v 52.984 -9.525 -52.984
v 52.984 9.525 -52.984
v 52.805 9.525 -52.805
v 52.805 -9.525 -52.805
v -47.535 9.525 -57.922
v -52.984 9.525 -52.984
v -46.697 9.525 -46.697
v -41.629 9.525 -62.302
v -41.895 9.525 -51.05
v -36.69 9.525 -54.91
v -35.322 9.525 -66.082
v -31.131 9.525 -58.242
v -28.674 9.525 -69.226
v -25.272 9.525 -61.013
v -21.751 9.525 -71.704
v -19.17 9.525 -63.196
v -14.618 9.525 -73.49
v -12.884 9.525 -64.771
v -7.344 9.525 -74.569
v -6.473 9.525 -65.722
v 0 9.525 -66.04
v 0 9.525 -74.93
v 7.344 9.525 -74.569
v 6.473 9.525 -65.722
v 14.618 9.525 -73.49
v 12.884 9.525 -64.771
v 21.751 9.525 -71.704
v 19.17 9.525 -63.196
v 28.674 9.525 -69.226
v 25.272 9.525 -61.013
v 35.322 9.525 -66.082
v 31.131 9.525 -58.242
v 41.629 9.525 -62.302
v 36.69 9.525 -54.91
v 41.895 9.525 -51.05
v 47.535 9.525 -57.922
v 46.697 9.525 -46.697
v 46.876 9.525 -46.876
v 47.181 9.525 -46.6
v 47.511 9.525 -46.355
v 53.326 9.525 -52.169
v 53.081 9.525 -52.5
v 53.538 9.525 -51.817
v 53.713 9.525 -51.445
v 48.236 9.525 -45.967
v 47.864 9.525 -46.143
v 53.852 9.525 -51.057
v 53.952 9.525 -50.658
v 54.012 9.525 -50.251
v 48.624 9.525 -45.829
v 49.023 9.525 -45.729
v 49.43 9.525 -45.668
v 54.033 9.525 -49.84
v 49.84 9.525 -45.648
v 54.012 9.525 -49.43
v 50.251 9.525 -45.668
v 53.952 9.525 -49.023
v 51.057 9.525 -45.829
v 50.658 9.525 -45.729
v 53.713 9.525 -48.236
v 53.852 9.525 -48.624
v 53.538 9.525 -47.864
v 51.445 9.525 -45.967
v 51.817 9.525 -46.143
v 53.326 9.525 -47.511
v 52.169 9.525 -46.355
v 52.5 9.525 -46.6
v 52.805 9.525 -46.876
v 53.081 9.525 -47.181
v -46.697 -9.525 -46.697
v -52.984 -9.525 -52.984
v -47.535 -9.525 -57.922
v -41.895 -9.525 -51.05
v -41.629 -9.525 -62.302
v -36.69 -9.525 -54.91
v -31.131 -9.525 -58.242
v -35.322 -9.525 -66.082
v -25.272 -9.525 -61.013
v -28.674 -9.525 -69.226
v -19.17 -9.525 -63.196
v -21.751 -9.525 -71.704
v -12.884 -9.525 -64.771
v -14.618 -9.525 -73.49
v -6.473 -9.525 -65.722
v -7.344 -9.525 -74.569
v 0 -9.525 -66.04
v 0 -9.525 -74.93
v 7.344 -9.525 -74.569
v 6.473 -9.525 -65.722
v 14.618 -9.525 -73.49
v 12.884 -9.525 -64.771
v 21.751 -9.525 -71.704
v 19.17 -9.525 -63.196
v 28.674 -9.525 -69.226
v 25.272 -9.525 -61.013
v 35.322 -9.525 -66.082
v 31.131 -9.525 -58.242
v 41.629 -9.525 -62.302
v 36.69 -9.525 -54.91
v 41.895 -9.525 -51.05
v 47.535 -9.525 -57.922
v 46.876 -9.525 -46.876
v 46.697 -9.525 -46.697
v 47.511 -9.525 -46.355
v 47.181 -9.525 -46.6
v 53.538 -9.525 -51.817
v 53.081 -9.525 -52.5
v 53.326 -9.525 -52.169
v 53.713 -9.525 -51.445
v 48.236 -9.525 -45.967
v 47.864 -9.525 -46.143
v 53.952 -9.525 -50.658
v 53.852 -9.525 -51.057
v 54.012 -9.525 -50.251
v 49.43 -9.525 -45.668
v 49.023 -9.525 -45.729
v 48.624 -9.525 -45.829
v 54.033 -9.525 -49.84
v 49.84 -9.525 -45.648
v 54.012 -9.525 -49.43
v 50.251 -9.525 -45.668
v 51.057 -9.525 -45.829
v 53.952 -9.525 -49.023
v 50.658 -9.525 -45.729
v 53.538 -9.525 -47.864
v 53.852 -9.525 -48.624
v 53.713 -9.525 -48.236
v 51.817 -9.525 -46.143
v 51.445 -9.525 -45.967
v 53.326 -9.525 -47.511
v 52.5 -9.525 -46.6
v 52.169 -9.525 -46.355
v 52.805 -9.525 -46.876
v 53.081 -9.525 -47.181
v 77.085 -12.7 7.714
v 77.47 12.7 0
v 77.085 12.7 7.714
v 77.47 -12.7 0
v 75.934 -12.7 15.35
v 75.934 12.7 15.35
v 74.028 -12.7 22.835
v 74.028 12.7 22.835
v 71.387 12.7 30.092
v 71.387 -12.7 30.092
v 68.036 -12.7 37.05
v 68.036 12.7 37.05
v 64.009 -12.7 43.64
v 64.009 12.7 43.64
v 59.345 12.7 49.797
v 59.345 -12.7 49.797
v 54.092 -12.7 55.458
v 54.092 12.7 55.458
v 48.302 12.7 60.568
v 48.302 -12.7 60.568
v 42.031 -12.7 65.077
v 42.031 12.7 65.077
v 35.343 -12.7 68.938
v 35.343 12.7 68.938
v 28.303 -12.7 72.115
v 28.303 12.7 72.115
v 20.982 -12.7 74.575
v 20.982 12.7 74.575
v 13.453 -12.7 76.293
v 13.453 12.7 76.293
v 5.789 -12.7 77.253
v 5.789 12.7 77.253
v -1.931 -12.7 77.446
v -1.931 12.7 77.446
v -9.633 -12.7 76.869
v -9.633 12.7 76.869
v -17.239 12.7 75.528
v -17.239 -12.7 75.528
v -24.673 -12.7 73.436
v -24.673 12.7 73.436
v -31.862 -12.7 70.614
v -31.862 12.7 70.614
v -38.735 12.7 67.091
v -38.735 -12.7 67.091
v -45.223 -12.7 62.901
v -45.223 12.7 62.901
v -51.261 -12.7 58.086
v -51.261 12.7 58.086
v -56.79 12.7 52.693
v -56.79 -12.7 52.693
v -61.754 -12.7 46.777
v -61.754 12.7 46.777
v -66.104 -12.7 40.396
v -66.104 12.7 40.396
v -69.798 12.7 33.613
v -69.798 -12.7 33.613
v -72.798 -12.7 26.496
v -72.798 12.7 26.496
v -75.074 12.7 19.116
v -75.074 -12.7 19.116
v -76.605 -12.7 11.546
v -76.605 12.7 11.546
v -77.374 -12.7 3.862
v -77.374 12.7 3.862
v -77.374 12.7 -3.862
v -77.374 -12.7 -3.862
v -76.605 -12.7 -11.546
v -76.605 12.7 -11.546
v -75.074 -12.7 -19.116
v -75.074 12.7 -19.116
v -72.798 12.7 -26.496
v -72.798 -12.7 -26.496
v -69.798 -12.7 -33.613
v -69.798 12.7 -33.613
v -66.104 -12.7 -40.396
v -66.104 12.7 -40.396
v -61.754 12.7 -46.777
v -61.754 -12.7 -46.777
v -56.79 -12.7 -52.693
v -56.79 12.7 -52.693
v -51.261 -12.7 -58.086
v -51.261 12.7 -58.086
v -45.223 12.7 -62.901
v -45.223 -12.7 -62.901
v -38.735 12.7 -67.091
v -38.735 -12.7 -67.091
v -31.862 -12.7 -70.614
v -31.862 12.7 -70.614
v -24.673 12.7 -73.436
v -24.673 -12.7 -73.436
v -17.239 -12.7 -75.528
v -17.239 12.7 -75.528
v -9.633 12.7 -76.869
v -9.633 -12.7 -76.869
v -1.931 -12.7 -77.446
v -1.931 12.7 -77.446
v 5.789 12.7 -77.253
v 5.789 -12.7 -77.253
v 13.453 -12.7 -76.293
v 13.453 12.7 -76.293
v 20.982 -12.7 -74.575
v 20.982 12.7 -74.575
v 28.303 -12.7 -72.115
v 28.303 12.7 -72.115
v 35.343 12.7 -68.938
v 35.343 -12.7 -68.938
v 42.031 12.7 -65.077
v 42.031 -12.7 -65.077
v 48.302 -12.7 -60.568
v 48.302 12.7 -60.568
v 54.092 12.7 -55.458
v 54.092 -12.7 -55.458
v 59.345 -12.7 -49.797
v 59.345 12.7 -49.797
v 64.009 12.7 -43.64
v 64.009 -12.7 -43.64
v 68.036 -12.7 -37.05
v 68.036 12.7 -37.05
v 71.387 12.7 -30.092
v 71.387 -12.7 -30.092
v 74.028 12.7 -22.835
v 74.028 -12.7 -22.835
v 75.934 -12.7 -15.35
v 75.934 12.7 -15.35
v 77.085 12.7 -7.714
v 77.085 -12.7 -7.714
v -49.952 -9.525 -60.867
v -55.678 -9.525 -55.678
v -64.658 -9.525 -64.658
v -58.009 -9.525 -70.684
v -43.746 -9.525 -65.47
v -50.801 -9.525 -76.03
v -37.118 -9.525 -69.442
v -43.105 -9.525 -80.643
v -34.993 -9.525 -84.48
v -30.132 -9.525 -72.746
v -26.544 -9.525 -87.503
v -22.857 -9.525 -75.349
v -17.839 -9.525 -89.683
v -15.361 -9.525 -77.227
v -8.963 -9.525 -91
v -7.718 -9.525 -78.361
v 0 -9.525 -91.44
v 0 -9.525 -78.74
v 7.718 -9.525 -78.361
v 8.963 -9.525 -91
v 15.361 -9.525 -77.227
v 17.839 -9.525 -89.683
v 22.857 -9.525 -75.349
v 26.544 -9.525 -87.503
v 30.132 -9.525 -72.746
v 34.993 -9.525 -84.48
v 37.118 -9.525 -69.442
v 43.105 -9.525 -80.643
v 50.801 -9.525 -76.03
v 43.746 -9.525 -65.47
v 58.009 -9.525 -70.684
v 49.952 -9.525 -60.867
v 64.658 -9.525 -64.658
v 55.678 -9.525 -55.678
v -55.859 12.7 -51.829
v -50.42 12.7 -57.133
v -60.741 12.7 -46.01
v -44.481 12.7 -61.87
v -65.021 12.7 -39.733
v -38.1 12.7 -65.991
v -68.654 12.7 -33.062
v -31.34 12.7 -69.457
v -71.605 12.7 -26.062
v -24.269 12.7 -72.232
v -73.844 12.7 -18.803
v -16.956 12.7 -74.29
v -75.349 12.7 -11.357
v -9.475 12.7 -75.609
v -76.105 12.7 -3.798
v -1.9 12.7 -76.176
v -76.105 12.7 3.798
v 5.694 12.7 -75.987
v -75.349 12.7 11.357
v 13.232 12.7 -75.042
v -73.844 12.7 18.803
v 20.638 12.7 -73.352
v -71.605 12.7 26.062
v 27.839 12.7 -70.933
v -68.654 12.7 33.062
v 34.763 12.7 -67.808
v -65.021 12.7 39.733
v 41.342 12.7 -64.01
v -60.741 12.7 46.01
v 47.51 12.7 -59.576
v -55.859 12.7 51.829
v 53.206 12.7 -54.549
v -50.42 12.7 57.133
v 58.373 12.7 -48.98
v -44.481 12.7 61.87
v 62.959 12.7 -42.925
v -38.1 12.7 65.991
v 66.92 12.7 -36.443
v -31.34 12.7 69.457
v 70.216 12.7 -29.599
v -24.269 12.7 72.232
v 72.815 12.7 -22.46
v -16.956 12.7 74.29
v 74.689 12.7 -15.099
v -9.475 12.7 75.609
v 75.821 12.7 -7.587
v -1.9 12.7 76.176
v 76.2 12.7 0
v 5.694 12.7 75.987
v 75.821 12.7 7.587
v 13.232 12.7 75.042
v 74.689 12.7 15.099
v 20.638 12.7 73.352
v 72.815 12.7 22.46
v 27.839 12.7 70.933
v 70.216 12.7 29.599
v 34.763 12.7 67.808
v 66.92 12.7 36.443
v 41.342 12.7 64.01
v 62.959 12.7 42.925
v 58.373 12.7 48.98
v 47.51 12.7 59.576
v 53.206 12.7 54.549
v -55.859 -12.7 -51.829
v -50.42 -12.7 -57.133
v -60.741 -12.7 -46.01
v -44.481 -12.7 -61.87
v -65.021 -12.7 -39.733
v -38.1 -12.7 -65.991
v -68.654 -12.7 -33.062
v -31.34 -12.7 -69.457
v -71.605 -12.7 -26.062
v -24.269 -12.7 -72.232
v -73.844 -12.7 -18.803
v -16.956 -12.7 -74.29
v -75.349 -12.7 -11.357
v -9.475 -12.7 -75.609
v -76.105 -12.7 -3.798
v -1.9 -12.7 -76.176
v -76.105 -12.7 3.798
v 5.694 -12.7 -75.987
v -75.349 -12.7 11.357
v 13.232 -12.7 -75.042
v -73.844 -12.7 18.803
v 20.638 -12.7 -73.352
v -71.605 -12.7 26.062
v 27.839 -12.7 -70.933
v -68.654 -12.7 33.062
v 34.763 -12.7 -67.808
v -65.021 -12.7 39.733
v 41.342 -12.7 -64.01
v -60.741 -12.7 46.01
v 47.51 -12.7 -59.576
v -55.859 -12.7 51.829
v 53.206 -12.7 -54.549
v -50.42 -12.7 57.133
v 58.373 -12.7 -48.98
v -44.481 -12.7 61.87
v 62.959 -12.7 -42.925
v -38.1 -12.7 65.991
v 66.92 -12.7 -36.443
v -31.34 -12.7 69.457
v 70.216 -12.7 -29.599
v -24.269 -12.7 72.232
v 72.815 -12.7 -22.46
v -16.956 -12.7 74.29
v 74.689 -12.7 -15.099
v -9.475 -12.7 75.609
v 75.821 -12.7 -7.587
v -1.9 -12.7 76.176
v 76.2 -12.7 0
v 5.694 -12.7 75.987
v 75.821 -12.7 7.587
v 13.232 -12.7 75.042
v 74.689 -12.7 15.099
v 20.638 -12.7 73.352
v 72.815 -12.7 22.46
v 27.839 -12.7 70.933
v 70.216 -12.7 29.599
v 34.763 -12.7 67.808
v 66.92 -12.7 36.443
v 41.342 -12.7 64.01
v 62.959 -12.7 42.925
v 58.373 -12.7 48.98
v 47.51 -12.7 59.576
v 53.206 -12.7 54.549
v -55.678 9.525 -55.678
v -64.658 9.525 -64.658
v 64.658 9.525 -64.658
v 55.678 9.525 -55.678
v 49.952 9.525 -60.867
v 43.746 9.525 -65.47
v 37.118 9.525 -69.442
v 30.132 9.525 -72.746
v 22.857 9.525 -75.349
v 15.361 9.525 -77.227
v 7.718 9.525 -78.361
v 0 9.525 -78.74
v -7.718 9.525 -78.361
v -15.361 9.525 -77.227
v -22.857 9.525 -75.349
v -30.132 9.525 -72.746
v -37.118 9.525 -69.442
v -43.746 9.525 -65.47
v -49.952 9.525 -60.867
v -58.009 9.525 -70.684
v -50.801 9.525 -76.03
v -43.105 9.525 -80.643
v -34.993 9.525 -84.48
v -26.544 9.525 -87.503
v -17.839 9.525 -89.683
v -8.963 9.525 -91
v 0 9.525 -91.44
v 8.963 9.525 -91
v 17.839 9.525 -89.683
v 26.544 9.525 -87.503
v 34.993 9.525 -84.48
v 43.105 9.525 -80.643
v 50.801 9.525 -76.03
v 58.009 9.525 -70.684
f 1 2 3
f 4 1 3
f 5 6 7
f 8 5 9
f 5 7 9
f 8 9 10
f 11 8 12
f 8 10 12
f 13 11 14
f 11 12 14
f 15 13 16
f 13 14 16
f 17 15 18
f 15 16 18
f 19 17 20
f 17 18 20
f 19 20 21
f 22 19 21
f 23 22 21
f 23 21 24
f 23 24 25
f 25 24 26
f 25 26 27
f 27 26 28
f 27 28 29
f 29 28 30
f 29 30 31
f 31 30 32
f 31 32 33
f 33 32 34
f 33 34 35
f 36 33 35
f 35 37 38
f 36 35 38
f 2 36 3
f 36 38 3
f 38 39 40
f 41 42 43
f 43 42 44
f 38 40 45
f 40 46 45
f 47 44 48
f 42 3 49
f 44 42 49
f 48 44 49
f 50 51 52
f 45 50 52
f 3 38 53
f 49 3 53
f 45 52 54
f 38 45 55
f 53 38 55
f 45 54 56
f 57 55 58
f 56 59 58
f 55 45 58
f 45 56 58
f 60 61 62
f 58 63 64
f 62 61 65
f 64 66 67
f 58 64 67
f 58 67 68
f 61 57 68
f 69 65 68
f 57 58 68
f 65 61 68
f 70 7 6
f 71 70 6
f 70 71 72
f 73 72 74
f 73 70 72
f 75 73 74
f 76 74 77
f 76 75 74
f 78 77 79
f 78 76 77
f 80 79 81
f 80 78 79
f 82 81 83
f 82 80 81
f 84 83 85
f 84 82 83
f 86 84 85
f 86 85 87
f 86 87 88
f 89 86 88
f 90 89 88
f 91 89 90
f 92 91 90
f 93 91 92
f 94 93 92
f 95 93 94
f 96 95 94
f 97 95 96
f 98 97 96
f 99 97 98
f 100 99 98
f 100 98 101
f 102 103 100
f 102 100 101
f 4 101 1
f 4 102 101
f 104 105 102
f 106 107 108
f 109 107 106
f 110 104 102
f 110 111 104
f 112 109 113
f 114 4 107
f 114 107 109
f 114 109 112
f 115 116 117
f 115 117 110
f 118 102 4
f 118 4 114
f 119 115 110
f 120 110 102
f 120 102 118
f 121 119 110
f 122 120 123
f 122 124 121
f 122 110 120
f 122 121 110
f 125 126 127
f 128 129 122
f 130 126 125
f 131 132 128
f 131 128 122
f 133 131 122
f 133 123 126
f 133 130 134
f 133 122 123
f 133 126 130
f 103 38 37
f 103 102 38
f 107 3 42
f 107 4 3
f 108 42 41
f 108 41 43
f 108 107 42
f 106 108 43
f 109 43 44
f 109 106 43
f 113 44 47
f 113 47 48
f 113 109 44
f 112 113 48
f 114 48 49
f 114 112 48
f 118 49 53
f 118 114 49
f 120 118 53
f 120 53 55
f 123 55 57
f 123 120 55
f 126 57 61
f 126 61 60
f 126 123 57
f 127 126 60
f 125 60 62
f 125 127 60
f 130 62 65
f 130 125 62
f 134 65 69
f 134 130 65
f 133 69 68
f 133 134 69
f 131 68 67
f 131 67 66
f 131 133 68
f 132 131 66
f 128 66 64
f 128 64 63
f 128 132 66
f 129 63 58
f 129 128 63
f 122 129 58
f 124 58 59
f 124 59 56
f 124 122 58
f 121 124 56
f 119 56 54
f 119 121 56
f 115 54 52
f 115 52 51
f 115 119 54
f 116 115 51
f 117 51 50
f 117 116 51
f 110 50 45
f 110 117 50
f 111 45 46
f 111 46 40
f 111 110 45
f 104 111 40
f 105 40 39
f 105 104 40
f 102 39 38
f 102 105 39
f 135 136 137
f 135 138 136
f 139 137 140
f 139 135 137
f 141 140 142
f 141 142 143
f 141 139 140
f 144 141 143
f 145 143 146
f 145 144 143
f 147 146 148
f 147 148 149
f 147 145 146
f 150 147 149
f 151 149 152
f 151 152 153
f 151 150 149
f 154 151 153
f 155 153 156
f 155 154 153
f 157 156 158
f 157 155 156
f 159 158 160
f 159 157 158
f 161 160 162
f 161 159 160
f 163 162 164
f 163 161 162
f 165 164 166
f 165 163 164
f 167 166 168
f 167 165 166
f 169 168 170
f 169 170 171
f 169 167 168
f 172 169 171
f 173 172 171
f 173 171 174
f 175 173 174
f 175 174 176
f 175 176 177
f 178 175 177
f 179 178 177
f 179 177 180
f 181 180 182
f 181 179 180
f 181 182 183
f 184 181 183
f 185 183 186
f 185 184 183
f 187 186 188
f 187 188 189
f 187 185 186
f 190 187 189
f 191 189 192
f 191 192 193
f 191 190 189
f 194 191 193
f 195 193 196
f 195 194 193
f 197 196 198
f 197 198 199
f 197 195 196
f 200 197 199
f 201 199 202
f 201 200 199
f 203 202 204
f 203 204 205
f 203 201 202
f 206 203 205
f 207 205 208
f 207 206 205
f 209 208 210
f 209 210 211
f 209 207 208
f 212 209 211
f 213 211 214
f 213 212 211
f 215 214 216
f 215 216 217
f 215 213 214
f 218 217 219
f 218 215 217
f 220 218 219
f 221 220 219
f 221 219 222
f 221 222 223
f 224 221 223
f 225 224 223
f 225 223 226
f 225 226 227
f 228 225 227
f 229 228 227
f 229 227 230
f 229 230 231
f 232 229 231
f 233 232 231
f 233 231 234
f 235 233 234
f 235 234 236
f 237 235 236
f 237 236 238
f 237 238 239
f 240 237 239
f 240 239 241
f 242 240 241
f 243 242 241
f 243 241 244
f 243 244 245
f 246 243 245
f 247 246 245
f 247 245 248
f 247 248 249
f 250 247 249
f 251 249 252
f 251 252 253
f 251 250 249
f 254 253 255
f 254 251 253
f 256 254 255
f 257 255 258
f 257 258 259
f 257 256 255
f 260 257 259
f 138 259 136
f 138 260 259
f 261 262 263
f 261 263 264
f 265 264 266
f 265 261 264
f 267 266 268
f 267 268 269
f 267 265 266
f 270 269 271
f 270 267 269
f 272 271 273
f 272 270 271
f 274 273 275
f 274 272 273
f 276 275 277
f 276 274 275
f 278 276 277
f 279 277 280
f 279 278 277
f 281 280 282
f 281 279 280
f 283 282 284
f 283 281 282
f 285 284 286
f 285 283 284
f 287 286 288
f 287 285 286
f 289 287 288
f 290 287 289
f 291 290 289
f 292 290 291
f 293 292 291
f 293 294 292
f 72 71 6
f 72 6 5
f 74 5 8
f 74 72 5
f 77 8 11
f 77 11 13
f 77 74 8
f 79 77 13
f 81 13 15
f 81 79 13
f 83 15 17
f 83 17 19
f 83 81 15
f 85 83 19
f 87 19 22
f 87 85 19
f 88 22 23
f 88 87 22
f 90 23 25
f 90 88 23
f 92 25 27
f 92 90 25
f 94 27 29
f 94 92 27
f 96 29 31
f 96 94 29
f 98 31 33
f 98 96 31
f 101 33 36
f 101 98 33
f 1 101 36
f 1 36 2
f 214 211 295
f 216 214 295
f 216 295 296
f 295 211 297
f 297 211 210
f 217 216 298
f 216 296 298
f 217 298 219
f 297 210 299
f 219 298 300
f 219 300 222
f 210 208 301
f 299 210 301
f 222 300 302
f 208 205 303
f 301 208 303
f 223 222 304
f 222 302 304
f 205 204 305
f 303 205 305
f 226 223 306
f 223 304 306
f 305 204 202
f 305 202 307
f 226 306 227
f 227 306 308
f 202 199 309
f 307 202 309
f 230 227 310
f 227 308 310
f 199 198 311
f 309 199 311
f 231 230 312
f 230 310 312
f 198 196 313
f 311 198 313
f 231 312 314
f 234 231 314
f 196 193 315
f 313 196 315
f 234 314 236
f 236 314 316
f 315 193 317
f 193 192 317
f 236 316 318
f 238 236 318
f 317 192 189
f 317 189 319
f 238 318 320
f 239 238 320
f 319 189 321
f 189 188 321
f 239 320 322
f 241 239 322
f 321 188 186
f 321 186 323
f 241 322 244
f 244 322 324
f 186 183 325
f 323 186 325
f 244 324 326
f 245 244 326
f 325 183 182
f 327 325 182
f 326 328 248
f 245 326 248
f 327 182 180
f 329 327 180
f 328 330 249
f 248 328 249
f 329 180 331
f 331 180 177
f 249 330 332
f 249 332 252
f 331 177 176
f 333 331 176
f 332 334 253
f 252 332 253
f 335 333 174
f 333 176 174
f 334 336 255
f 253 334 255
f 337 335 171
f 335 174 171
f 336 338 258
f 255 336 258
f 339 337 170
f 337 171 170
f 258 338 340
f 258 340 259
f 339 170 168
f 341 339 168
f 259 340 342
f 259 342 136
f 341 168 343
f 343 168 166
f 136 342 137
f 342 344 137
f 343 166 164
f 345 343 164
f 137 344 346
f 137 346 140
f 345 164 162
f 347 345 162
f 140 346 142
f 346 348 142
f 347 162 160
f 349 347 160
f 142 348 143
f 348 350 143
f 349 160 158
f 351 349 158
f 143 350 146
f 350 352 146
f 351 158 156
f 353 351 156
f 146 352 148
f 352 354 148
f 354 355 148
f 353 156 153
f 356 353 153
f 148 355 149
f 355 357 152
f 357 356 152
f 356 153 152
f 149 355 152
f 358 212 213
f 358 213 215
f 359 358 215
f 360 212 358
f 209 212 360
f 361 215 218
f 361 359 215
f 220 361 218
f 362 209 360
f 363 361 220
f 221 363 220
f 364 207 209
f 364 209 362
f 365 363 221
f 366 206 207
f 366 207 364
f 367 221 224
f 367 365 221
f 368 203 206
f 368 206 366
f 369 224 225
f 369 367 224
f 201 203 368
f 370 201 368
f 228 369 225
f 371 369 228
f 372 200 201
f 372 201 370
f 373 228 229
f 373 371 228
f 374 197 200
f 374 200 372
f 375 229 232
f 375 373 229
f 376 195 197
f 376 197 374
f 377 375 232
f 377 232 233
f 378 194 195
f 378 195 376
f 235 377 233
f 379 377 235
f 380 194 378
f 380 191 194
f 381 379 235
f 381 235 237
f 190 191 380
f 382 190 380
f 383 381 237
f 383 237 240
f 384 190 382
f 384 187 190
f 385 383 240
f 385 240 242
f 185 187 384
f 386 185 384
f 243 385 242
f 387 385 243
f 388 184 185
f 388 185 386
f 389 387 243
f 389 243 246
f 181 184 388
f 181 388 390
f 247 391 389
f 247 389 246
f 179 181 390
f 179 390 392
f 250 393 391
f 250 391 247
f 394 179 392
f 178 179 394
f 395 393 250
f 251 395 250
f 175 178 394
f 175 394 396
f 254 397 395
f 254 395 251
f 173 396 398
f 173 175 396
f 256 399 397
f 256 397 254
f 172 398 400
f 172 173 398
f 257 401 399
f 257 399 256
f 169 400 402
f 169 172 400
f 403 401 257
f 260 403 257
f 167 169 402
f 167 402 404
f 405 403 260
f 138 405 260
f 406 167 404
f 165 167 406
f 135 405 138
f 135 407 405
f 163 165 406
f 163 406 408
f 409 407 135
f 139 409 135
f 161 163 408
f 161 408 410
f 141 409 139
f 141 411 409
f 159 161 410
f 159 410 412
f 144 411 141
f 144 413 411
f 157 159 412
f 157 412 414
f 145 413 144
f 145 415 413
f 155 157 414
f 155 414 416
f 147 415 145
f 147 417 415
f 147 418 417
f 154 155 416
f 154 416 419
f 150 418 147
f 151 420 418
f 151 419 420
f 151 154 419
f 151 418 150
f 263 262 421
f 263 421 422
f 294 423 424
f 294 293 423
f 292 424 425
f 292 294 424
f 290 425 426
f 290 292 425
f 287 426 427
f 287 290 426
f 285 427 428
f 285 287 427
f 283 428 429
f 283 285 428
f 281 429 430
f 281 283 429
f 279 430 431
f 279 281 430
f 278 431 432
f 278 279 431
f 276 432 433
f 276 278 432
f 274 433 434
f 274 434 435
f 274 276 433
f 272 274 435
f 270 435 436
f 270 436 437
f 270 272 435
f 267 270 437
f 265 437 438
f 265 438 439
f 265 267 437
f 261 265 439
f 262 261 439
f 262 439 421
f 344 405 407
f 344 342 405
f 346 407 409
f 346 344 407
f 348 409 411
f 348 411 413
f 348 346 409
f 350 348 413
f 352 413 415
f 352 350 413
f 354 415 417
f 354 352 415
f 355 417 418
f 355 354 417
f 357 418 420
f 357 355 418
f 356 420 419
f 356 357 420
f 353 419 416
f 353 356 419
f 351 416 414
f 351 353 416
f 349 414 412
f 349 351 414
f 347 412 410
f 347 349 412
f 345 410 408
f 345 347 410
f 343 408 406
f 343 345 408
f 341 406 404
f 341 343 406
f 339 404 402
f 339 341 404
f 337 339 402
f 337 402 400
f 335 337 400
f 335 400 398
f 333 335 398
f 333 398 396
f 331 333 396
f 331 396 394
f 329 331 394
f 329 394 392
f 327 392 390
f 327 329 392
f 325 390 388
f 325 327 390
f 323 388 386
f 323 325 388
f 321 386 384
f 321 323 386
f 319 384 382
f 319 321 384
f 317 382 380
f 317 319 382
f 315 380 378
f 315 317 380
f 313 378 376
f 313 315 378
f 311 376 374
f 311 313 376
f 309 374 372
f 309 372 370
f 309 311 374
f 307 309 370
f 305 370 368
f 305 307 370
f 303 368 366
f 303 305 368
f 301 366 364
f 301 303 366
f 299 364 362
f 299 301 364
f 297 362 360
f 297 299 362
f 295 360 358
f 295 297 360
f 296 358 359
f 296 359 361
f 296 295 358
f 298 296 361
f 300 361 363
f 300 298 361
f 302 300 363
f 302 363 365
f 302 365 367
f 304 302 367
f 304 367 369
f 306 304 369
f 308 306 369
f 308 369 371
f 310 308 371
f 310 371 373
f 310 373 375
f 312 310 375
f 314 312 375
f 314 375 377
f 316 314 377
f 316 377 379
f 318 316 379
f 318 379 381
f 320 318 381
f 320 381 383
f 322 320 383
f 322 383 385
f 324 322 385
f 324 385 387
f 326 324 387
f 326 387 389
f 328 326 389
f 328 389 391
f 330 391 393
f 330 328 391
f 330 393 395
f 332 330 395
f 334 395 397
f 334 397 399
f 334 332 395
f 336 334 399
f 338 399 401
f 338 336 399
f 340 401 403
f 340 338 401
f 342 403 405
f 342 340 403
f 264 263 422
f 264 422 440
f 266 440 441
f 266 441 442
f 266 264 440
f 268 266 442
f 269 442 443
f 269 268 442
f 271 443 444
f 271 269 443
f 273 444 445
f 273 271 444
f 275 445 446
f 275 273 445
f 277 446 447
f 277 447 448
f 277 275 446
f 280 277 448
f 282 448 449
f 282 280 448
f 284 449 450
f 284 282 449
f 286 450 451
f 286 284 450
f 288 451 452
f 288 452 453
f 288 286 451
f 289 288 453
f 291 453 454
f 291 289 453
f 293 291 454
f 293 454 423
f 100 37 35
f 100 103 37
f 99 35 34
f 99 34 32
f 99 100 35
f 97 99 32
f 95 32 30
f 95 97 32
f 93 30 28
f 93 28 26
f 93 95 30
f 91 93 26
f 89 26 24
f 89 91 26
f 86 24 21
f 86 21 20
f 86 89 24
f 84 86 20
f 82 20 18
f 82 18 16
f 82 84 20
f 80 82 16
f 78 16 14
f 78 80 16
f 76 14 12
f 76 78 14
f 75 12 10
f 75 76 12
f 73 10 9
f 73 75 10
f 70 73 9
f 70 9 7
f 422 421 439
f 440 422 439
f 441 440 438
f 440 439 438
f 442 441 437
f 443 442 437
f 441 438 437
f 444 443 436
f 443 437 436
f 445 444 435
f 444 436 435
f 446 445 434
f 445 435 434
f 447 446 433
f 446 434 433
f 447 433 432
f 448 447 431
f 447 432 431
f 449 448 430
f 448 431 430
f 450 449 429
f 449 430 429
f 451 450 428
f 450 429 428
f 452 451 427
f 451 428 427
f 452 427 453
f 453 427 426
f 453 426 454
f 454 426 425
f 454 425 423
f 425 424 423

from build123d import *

# Parameters (mm, degrees)
F0_R     = 77.47
F0_R_2   = 76.2
F1_DEPTH = 12.7
F3_DEPTH = 9.525


with BuildPart() as f1:
    # F0 (on Front) → F1 (new body, symmetric)
    with BuildSketch(Plane.XZ):
        Circle(F0_R)
        Circle(F0_R_2, mode=Mode.SUBTRACT)
    extrude(amount=F1_DEPTH, both=True)


with BuildPart() as f3:
    # F2 (on Front) → F3 (new body, symmetric)
    with BuildSketch(Plane.XZ):
        with BuildLine():
            ThreePointArc((46.6973318296, -46.6973318296), (0, -66.04), (-46.6973318296, -46.6973318296))
            Line((-46.6973318296, -46.6973318296), (-52.9835111143, -52.9835111143))
            ThreePointArc((-52.9835111143, -52.9835111143), (0, -74.93), (52.9835111143, -52.9835111143))
            Line((52.9835111143, -52.9835111143), (52.804724794, -52.804724794))
            ThreePointArc((52.804724794, -52.804724794), (52.804724794, -46.8761181498), (46.8761181498, -46.8761181498))
            Line((46.8761181498, -46.8761181498), (46.6973318296, -46.6973318296))
        make_face()
    extrude(amount=F3_DEPTH, both=True)


with BuildPart() as f3b:
    # F2 (on Front) → F3, piece 2 (new body, symmetric)
    with BuildSketch(Plane.XZ):
        with BuildLine():
            ThreePointArc((55.6775879506, -55.6775879506), (0, -78.74), (-55.6775879506, -55.6775879506))
            Line((-55.6775879506, -55.6775879506), (-64.6578440717, -64.6578440717))
            ThreePointArc((-64.6578440717, -64.6578440717), (0, -91.44), (64.6578440717, -64.6578440717))
            Line((64.6578440717, -64.6578440717), (55.6775879506, -55.6775879506))
        make_face()
    extrude(amount=F3_DEPTH, both=True)


solid = Compound([f1.part, f3.part, f3b.part])
